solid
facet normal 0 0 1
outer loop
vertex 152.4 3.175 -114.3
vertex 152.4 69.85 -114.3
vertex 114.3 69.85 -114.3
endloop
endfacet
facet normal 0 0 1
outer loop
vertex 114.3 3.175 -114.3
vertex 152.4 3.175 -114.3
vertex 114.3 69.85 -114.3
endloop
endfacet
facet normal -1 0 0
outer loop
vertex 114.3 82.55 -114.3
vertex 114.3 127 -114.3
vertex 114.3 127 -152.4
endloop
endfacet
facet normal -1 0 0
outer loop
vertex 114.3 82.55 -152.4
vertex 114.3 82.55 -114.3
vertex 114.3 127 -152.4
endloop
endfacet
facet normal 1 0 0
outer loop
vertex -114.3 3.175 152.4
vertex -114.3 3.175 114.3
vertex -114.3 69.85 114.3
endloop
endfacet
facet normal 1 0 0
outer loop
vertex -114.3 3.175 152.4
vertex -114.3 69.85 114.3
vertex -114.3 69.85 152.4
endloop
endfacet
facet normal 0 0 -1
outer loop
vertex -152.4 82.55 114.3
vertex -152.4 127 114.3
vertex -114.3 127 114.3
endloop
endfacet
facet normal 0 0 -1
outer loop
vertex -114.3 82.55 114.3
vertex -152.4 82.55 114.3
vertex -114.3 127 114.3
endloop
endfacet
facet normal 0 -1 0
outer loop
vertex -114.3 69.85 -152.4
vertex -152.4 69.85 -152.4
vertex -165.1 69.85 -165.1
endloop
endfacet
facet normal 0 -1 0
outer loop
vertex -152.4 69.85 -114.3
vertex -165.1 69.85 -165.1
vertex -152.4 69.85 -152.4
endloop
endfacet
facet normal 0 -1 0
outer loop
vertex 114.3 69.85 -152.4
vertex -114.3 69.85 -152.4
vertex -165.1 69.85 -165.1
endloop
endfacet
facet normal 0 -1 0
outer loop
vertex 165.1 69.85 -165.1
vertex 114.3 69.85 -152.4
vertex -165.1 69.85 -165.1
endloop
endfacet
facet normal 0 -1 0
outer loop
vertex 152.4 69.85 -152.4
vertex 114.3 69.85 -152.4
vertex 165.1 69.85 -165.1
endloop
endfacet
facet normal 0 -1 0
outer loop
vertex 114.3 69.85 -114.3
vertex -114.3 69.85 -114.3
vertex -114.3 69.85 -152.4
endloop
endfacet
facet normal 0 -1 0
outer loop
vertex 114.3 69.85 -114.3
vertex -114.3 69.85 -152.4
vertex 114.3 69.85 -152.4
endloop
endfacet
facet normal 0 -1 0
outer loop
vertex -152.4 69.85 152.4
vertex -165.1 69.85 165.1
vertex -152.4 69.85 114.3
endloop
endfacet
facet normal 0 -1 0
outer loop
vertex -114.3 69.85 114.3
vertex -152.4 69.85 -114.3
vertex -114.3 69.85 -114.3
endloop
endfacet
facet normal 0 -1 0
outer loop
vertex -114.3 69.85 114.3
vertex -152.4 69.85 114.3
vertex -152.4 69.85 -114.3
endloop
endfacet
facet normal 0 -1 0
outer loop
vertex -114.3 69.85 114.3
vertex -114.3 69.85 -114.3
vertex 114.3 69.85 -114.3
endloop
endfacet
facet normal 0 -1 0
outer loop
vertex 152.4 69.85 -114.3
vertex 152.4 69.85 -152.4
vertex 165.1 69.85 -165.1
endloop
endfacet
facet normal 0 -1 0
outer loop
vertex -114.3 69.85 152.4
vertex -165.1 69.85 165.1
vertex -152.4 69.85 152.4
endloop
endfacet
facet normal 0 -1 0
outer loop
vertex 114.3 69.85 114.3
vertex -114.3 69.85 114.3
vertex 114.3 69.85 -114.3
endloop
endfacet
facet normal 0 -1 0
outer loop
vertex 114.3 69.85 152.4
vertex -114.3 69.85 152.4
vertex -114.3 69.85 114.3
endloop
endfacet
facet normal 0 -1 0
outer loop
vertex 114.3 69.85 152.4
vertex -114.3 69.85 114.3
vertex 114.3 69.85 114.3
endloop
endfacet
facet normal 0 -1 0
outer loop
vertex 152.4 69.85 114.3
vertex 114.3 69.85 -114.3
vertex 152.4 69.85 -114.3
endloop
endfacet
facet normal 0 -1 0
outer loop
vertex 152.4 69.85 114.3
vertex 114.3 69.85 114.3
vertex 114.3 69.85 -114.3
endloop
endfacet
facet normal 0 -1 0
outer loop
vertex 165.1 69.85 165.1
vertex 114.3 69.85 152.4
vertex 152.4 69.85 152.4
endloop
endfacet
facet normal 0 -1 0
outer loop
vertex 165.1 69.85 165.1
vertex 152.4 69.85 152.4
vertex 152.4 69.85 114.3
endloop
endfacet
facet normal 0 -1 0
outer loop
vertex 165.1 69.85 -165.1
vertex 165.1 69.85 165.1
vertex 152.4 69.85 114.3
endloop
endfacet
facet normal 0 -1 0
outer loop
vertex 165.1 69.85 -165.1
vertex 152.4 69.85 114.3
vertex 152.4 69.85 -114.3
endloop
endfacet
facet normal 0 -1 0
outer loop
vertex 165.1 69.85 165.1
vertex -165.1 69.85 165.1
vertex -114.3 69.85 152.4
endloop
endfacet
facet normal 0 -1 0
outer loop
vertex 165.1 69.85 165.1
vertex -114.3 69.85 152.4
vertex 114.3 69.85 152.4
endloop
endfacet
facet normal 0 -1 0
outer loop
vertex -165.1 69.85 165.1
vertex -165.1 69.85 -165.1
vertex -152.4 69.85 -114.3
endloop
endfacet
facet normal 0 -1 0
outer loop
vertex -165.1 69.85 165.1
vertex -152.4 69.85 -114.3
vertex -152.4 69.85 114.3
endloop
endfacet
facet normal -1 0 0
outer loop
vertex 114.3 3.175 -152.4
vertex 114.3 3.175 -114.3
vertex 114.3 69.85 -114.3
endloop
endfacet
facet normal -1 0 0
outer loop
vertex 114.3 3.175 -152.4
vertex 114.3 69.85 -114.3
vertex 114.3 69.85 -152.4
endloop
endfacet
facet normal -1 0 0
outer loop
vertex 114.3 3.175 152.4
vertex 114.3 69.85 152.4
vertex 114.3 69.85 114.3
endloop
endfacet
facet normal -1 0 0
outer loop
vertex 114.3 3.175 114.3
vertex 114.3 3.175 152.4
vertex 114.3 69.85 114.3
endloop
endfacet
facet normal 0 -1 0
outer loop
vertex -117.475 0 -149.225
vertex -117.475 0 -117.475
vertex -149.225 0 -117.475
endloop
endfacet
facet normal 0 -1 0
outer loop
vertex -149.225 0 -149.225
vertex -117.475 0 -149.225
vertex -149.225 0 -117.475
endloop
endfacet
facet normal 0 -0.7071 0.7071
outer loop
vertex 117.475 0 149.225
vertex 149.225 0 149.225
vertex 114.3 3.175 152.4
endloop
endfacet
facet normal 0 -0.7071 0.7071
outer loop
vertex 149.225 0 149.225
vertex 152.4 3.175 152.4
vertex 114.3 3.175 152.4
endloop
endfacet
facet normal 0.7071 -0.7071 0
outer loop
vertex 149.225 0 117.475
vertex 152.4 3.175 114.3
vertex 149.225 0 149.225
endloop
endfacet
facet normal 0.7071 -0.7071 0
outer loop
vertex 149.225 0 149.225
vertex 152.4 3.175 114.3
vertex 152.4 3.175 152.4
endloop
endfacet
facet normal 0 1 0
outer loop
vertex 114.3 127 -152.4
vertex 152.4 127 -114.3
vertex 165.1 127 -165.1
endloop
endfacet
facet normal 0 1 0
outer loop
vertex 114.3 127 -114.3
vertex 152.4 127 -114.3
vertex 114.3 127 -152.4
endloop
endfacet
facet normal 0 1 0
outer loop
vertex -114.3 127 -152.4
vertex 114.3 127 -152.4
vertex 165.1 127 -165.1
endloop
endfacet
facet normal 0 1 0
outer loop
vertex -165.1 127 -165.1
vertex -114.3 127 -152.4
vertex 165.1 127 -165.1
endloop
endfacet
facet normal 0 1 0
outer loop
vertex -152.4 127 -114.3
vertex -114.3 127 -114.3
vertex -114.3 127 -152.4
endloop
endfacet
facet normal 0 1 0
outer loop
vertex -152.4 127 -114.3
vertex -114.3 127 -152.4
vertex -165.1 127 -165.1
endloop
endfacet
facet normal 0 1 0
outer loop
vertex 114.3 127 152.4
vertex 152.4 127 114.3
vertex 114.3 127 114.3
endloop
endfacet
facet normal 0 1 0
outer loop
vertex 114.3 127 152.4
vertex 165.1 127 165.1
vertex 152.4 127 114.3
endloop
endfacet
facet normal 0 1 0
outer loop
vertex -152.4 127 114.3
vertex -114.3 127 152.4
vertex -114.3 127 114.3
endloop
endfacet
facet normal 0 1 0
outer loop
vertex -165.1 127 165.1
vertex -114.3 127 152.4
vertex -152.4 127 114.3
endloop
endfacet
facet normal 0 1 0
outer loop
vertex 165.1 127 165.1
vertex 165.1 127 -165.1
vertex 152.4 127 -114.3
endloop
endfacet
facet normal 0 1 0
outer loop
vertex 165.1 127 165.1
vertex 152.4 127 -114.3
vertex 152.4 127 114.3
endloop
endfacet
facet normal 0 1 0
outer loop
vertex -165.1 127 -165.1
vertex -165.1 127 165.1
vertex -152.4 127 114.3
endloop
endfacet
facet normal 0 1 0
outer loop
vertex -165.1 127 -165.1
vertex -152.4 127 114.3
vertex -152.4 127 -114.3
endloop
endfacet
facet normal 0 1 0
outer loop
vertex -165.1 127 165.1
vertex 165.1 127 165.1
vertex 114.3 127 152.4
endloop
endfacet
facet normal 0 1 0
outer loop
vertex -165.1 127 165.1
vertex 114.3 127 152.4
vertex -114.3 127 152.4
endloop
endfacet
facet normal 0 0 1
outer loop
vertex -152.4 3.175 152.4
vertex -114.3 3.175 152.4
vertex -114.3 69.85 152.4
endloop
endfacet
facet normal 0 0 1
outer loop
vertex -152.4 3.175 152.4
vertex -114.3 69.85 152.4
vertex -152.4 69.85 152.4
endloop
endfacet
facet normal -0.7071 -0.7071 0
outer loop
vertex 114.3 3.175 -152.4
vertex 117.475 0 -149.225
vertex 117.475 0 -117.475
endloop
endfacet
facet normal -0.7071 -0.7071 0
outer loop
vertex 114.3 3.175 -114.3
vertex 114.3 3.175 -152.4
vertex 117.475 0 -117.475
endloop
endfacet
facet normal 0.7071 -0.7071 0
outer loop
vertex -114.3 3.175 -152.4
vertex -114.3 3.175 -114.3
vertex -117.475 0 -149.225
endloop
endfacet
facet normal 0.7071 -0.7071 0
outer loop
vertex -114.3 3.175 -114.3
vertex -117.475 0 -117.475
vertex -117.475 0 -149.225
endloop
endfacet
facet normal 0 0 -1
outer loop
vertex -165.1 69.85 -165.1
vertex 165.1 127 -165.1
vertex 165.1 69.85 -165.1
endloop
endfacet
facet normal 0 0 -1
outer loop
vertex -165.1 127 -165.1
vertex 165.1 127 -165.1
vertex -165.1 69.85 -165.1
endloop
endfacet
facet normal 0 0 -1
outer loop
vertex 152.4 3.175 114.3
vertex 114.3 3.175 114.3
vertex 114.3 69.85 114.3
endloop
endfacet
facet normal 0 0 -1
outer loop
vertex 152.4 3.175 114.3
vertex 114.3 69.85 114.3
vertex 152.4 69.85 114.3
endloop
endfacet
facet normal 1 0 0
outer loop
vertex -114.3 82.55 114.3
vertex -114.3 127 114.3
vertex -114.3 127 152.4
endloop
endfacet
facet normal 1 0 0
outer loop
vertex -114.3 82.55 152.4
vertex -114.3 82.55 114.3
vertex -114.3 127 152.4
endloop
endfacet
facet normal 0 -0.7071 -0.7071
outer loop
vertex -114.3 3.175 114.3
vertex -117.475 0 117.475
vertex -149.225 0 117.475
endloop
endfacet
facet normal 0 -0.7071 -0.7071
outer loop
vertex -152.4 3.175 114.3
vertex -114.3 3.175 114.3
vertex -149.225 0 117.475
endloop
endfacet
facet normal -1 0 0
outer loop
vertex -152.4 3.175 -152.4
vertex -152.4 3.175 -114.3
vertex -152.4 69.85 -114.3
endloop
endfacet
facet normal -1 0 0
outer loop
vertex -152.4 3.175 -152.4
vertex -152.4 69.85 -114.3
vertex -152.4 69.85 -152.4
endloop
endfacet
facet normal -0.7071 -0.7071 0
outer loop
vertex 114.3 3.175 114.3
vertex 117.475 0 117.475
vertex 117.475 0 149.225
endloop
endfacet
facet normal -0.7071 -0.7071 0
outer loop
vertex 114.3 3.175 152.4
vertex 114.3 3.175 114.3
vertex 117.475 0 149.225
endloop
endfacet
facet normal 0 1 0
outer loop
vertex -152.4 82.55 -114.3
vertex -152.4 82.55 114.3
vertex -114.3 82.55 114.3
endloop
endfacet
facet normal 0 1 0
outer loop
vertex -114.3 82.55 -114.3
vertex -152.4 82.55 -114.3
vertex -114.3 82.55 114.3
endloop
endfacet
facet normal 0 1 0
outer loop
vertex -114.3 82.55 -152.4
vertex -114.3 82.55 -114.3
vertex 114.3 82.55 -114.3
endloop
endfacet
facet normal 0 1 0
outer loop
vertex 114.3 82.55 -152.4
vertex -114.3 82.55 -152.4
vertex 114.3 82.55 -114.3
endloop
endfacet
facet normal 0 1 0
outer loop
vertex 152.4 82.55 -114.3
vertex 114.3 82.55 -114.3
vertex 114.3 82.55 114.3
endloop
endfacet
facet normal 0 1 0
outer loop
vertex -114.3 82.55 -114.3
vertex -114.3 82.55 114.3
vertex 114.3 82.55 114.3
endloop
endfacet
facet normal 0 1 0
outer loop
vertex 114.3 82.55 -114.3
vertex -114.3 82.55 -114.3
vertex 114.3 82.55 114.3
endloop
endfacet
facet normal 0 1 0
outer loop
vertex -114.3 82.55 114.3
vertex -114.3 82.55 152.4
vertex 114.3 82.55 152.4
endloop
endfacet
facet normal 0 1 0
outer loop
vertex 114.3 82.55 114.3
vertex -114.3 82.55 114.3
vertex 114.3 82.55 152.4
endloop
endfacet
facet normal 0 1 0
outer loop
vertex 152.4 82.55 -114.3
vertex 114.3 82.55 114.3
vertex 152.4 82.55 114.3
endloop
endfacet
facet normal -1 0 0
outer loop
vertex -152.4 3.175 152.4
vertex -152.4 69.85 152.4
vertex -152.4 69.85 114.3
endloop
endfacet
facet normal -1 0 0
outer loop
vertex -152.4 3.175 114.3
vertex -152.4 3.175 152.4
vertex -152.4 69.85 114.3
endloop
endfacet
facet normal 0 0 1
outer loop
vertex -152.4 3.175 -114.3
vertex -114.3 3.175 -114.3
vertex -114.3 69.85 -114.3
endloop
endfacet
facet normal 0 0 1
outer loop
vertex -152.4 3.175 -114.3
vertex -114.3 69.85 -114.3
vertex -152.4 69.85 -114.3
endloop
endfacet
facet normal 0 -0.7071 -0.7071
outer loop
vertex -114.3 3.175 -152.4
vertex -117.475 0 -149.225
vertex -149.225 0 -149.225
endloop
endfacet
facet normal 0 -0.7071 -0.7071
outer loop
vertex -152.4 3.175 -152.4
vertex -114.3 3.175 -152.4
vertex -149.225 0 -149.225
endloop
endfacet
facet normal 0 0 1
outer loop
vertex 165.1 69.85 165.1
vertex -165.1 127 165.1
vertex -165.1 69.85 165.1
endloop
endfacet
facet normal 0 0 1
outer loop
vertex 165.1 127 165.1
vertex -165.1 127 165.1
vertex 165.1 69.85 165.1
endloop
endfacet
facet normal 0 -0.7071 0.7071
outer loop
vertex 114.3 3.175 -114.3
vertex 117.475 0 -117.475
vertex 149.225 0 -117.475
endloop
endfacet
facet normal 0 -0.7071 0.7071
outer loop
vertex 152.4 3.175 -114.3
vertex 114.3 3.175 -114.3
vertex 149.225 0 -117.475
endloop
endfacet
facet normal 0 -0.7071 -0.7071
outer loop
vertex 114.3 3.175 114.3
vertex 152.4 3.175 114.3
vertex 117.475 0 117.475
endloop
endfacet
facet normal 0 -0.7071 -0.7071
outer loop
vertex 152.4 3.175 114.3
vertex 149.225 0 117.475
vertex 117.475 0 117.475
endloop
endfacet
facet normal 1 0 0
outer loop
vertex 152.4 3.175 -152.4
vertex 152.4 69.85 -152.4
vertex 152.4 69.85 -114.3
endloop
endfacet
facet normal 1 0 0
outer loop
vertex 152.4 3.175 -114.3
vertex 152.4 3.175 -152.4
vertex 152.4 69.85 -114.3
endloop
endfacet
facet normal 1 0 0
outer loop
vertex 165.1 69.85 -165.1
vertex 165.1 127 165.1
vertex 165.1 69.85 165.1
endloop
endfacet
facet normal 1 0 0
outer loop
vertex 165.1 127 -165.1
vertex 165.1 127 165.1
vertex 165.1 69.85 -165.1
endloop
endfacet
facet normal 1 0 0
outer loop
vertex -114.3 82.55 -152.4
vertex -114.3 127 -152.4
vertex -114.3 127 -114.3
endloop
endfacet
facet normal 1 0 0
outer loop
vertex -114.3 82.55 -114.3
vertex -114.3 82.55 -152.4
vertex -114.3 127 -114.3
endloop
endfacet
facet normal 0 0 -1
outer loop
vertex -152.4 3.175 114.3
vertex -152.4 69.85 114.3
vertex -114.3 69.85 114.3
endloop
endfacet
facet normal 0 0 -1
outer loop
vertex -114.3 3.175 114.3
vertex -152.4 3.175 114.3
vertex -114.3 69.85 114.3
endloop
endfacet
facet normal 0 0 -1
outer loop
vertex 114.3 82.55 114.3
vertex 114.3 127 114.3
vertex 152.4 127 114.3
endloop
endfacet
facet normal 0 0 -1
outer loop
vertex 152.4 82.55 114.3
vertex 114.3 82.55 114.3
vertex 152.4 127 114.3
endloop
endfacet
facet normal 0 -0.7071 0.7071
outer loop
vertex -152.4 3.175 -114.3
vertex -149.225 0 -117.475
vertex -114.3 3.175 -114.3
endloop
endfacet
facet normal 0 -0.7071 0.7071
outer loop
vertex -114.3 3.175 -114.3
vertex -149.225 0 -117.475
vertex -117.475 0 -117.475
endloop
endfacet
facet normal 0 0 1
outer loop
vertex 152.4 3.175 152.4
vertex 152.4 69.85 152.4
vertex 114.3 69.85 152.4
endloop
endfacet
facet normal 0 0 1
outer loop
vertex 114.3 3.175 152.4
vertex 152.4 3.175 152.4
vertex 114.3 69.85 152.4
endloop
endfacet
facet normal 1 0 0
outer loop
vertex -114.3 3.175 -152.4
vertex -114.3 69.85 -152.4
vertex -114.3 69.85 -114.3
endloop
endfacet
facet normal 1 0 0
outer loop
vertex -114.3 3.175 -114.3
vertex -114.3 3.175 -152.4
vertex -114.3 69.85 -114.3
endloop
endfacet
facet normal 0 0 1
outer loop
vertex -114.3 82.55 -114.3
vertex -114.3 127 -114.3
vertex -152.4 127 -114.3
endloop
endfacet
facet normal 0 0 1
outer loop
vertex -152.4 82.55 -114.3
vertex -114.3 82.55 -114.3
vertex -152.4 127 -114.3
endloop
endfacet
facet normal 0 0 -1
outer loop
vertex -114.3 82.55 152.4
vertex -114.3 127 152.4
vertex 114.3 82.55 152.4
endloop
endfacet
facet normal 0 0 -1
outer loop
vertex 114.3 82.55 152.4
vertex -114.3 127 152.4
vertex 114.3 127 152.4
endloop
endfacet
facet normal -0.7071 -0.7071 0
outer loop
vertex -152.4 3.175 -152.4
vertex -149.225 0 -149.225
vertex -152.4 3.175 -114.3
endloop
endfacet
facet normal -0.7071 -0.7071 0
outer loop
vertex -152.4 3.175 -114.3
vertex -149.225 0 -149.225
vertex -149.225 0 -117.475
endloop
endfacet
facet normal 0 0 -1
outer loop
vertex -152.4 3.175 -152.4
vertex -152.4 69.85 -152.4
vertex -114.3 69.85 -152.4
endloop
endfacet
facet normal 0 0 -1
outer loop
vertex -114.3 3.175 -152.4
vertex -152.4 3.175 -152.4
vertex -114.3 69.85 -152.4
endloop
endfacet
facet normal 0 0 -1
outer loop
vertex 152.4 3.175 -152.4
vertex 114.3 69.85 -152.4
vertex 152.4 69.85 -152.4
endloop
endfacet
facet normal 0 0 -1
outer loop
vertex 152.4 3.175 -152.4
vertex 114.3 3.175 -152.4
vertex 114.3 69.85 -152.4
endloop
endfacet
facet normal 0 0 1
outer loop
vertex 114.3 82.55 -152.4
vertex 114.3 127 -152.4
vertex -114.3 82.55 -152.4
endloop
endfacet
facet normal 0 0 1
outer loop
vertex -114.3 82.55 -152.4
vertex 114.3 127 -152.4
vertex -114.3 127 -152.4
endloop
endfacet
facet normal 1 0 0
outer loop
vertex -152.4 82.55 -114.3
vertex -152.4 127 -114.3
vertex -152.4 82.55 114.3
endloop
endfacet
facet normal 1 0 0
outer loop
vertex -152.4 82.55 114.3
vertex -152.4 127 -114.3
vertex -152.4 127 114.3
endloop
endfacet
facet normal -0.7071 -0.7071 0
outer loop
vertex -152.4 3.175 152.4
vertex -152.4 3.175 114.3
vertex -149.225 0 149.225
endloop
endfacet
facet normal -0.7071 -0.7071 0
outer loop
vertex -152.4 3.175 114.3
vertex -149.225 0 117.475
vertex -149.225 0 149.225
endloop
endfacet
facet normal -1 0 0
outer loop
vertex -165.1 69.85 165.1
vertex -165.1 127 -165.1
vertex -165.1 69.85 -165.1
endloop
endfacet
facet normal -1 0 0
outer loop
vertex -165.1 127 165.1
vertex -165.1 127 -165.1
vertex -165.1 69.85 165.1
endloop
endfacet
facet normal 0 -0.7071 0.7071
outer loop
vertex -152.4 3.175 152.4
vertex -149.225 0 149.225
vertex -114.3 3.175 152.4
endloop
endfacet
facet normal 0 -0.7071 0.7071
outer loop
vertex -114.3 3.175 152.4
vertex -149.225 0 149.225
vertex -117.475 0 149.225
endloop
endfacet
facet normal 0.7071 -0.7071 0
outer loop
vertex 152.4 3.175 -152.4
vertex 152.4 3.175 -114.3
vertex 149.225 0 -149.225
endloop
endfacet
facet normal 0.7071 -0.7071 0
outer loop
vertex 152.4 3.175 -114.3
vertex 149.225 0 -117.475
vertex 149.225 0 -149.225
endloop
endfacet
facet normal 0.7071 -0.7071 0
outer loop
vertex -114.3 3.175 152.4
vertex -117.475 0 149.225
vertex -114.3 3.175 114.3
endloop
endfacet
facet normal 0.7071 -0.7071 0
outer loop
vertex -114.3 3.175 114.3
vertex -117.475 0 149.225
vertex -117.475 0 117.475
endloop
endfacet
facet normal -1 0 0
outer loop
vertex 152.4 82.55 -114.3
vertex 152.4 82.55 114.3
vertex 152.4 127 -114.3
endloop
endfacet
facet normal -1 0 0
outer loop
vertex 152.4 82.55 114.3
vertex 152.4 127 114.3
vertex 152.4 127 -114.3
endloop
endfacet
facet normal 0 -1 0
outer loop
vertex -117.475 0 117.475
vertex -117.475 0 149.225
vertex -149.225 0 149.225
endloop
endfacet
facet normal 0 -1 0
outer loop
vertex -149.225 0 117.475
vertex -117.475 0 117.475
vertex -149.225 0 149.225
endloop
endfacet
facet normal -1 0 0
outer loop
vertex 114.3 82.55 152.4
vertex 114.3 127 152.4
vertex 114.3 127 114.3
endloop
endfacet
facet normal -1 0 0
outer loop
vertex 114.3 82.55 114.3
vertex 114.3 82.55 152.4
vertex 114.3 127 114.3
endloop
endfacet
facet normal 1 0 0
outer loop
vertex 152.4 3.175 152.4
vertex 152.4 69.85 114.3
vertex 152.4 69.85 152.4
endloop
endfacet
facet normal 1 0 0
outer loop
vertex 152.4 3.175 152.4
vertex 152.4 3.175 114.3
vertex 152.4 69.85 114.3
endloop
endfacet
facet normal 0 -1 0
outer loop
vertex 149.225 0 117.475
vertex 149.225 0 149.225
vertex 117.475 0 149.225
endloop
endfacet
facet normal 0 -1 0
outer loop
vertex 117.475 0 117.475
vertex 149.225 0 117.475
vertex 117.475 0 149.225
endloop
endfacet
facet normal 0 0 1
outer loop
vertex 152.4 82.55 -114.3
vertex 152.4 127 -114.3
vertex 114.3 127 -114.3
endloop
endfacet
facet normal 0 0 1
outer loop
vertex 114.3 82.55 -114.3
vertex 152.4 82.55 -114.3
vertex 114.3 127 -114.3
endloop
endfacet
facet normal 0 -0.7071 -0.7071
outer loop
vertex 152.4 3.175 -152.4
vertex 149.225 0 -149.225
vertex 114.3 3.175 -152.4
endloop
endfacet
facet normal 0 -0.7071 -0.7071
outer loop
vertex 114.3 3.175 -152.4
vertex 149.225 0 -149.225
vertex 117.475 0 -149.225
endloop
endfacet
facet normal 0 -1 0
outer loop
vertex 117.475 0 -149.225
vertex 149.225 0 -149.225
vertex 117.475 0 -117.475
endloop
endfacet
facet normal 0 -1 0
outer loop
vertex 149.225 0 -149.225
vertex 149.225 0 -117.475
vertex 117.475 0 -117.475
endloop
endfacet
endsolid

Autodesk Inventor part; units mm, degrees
ref_plane "YZ Plane" through (0, 0, 0) normal (1, 0, 0) x (0, 1, 0)
ref_plane "XZ Plane" through (0, 0, 0) normal (0, 1, 0) x (-1, 0, 0)
ref_plane "XY Plane" through (0, 0, 0) normal (0, 0, 1) x (1, 0, 0)
sketch "Sketch1" plane through (0, 0, 0) normal (0, 1, 0) x (-1, 0, 0)
  line L0 (-152.4, 152.4) -> (152.4, 152.4) construction
  line L1 (152.4, 152.4) -> (152.4, -152.4) construction
  line L2 (152.4, -152.4) -> (-152.4, -152.4) construction
  line L3 (-152.4, -152.4) -> (-152.4, 152.4) construction
  line L4 (-152.4, 152.4) -> (152.4, -152.4) construction
  line L5 (152.4, 152.4) -> (-152.4, -152.4) construction
  line L6 (152.4, -152.4) -> (114.3, -152.4)
  line L7 (114.3, -152.4) -> (114.3, -114.3)
  line L8 (114.3, -114.3) -> (152.4, -114.3)
  line L9 (152.4, -114.3) -> (152.4, -152.4)
  line L10 (152.4, 152.4) -> (152.4, 114.3)
  line L11 (152.4, 114.3) -> (114.3, 114.3)
  line L12 (114.3, 114.3) -> (114.3, 152.4)
  line L13 (114.3, 152.4) -> (152.4, 152.4)
  line L14 (-152.4, 152.4) -> (-114.3, 152.4)
  line L15 (-114.3, 152.4) -> (-114.3, 114.3)
  line L16 (-114.3, 114.3) -> (-152.4, 114.3)
  line L17 (-152.4, 114.3) -> (-152.4, 152.4)
  line L18 (-152.4, -152.4) -> (-152.4, -114.3)
  line L19 (-152.4, -114.3) -> (-114.3, -114.3)
  line L20 (-114.3, -114.3) -> (-114.3, -152.4)
  line L21 (-114.3, -152.4) -> (-152.4, -152.4)
  point P0 (0, 0)
  dimension "d0" = 304.8
  dimension "d1" = 304.8
  dimension "d2" = 38.1
  dimension "d5" = 360
extrude "Extrusion1" add sketch "Sketch1" along normal blind 127
sketch "Sketch2" plane through (0, 127, 0) normal (0, 1, 0) x (1, 0, 0)
  line L0 (-114.3, 152.4) -> (-152.4, 152.4) projected
  line L1 (-152.4, 152.4) -> (-152.4, 114.3) projected
  line L2 (-152.4, 114.3) -> (-114.3, 114.3) projected
  line L3 (-114.3, 114.3) -> (-114.3, 152.4) projected
  line L4 (152.4, 114.3) -> (152.4, 152.4) projected
  line L5 (152.4, 152.4) -> (114.3, 152.4) projected
  line L6 (114.3, 152.4) -> (114.3, 114.3) projected
  line L7 (114.3, 114.3) -> (152.4, 114.3) projected
  line L8 (114.3, -152.4) -> (152.4, -152.4) projected
  line L9 (152.4, -152.4) -> (152.4, -114.3) projected
  line L10 (152.4, -114.3) -> (114.3, -114.3) projected
  line L11 (114.3, -114.3) -> (114.3, -152.4) projected
  line L12 (-152.4, -114.3) -> (-152.4, -152.4) projected
  line L13 (-152.4, -152.4) -> (-114.3, -152.4) projected
  line L14 (-114.3, -152.4) -> (-114.3, -114.3) projected
  line L15 (-114.3, -114.3) -> (-152.4, -114.3) projected
  line L16 (0, 231.14) -> (0, -231.14) projected
  line L17 (231.14, 0) -> (-231.14, 0) projected
  line L18 (-152.4, 152.4) -> (-152.4, -152.4)
  line L19 (-152.4, -152.4) -> (152.4, -152.4)
  line L20 (152.4, -152.4) -> (152.4, 152.4)
  line L21 (152.4, 152.4) -> (-152.4, 152.4)
  line L22 (-165.1, 165.1) -> (-165.1, -165.1)
  line L23 (-165.1, -165.1) -> (165.1, -165.1)
  line L24 (165.1, -165.1) -> (165.1, 165.1)
  line L25 (165.1, 165.1) -> (-165.1, 165.1)
  point P0 (0, 0)
  dimension "d9" = 12.7
extrude "Extrusion2" add sketch "Sketch2" against normal blind 57.15 contours L0 L1 L18 L17 L22 L25 L16 L21 | L16 L25 L24 L17 L20 L4 L5 L21 | L18 L12 L13 L19 L16 L23 L22 L17 | L19 L8 L9 L20 L17 L24 L23 L16
sketch "Sketch3" plane through (0, 69.85, 0) normal (0, -1, 0) x (1, 0, 0)
  line L0 (-165.1, 165.1) -> (165.1, 165.1) projected
  line L1 (-165.1, -165.1) -> (-165.1, 165.1) projected
  line L2 (-165.1, 165.1) -> (165.1, 165.1) projected
  line L3 (165.1, 165.1) -> (165.1, -165.1) projected
  line L4 (165.1, -165.1) -> (-165.1, -165.1) projected
  line L5 (114.3, 152.4) -> (-114.3, 152.4) projected
  line L6 (-114.3, 152.4) -> (-114.3, 114.3) projected
  line L7 (-114.3, 114.3) -> (-152.4, 114.3) projected
  line L8 (-152.4, 114.3) -> (-152.4, -114.3) projected
  line L9 (-152.4, -114.3) -> (-114.3, -114.3) projected
  line L10 (-114.3, -114.3) -> (-114.3, -152.4) projected
  line L11 (-114.3, -152.4) -> (114.3, -152.4) projected
  line L12 (114.3, -152.4) -> (114.3, -114.3) projected
  line L13 (114.3, -114.3) -> (152.4, -114.3) projected
  line L14 (152.4, -114.3) -> (152.4, 114.3) projected
  line L15 (152.4, 114.3) -> (114.3, 114.3) projected
  line L16 (114.3, 114.3) -> (114.3, 152.4) projected
  point P0 (0, 0)
extrude "Extrusion3" add sketch "Sketch3" against normal blind 12.7 contours L16 L15 L14 L13 L12 L11 L10 L9 L8 L7 L6 L5
chamfer "Chamfer1" distance 3.175 angle 45 16 edges at (-152.4, 0, 133.35) (-133.35, 0, 152.4) (-114.3, 0, 133.35) (-133.35, 0, 114.3) (-152.4, 0, -133.35) (-133.35, 0, -114.3) (-114.3, 0, -133.35) (-133.35, 0, -152.4) (114.3, 0, -133.35) (133.35, 0, -152.4) (133.35, 0, -114.3) (152.4, 0, -133.35) (133.35, 0, 114.3) (114.3, 0, 133.35) (133.35, 0, 152.4) (152.4, 0, 133.35)
properties part number "Pen"
